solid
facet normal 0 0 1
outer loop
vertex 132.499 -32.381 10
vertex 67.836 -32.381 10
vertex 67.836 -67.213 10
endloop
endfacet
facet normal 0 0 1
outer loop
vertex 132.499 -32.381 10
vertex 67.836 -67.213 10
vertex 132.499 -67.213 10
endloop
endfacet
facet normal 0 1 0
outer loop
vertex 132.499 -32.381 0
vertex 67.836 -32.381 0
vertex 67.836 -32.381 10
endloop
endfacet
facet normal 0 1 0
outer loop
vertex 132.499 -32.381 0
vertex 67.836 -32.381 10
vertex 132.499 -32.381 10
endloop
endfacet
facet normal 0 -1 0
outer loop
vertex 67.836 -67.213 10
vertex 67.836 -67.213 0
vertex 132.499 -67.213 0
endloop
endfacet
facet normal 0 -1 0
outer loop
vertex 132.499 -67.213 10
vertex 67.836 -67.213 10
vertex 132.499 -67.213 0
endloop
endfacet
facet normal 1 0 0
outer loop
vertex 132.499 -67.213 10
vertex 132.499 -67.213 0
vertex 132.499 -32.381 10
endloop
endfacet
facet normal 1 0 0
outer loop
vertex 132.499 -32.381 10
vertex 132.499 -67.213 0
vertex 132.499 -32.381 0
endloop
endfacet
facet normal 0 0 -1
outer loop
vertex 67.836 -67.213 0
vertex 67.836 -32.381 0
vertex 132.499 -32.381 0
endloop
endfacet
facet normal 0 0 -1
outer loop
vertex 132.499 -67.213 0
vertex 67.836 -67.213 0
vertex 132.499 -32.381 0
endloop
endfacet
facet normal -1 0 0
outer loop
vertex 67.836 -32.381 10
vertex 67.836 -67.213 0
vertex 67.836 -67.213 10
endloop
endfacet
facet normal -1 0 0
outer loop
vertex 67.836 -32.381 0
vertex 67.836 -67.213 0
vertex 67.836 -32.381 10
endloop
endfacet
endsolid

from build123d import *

# Parameters (mm, degrees)
CIRCLE001_R      = 0.5
EXTRUDE094_DEPTH = 10
CIRCLE002_R      = 0.5
EXTRUDE095_DEPTH = 10
CIRCLE003_R      = 0.5
EXTRUDE096_DEPTH = 10
RECTANGLE_W      = 64.662742
RECTANGLE_H      = 34.831528
EXTRUDE097_DEPTH = 10
CIRCLE_R         = 0.5
EXTRUDE093_DEPTH = 10


with BuildPart() as extrude094:
    # Circle001 → Extrude094 (new body)
    with BuildSketch(Plane(origin=(130.060043, -64.785744, 0), x_dir=(1, 0, 0), z_dir=(0, 0, 1))):
        Circle(CIRCLE001_R)
    extrude(amount=EXTRUDE094_DEPTH)


with BuildPart() as extrude095:
    # Circle002 → Extrude095 (new body)
    with BuildSketch(Plane(origin=(70.798393, -64.7696, 0), x_dir=(1, 0, 0), z_dir=(0, 0, 1))):
        Circle(CIRCLE002_R)
    extrude(amount=EXTRUDE095_DEPTH)


with BuildPart() as extrude096:
    # Circle003 → Extrude096 (new body)
    with BuildSketch(Plane(origin=(70.79007, -35.800797, 0), x_dir=(1, 0, 0), z_dir=(0, 0, 1))):
        Circle(CIRCLE003_R)
    extrude(amount=EXTRUDE096_DEPTH)


with BuildPart() as extrude097:
    # Rectangle → Extrude097 (new body)
    with BuildSketch(Plane(origin=(67.836318, -67.212706, 0), x_dir=(1, 0, 0), z_dir=(0, 0, 1))):
        with Locations((32.331371, 17.415764)):
            Rectangle(RECTANGLE_W, RECTANGLE_H)
    extrude(amount=EXTRUDE097_DEPTH)


with BuildPart() as fusion001:
    # Circle → Extrude093 (new body)
    with BuildSketch(Plane(origin=(130.059311, -35.555641, 0), x_dir=(1, 0, 0), z_dir=(0, 0, 1))):
        Circle(CIRCLE_R)
    extrude(amount=EXTRUDE093_DEPTH)

    # Fusion001: union Extrude094, Extrude095, Extrude096, Extrude097
    add(extrude094.part)
    add(extrude095.part)
    add(extrude096.part)
    add(extrude097.part)


solid = fusion001.part
